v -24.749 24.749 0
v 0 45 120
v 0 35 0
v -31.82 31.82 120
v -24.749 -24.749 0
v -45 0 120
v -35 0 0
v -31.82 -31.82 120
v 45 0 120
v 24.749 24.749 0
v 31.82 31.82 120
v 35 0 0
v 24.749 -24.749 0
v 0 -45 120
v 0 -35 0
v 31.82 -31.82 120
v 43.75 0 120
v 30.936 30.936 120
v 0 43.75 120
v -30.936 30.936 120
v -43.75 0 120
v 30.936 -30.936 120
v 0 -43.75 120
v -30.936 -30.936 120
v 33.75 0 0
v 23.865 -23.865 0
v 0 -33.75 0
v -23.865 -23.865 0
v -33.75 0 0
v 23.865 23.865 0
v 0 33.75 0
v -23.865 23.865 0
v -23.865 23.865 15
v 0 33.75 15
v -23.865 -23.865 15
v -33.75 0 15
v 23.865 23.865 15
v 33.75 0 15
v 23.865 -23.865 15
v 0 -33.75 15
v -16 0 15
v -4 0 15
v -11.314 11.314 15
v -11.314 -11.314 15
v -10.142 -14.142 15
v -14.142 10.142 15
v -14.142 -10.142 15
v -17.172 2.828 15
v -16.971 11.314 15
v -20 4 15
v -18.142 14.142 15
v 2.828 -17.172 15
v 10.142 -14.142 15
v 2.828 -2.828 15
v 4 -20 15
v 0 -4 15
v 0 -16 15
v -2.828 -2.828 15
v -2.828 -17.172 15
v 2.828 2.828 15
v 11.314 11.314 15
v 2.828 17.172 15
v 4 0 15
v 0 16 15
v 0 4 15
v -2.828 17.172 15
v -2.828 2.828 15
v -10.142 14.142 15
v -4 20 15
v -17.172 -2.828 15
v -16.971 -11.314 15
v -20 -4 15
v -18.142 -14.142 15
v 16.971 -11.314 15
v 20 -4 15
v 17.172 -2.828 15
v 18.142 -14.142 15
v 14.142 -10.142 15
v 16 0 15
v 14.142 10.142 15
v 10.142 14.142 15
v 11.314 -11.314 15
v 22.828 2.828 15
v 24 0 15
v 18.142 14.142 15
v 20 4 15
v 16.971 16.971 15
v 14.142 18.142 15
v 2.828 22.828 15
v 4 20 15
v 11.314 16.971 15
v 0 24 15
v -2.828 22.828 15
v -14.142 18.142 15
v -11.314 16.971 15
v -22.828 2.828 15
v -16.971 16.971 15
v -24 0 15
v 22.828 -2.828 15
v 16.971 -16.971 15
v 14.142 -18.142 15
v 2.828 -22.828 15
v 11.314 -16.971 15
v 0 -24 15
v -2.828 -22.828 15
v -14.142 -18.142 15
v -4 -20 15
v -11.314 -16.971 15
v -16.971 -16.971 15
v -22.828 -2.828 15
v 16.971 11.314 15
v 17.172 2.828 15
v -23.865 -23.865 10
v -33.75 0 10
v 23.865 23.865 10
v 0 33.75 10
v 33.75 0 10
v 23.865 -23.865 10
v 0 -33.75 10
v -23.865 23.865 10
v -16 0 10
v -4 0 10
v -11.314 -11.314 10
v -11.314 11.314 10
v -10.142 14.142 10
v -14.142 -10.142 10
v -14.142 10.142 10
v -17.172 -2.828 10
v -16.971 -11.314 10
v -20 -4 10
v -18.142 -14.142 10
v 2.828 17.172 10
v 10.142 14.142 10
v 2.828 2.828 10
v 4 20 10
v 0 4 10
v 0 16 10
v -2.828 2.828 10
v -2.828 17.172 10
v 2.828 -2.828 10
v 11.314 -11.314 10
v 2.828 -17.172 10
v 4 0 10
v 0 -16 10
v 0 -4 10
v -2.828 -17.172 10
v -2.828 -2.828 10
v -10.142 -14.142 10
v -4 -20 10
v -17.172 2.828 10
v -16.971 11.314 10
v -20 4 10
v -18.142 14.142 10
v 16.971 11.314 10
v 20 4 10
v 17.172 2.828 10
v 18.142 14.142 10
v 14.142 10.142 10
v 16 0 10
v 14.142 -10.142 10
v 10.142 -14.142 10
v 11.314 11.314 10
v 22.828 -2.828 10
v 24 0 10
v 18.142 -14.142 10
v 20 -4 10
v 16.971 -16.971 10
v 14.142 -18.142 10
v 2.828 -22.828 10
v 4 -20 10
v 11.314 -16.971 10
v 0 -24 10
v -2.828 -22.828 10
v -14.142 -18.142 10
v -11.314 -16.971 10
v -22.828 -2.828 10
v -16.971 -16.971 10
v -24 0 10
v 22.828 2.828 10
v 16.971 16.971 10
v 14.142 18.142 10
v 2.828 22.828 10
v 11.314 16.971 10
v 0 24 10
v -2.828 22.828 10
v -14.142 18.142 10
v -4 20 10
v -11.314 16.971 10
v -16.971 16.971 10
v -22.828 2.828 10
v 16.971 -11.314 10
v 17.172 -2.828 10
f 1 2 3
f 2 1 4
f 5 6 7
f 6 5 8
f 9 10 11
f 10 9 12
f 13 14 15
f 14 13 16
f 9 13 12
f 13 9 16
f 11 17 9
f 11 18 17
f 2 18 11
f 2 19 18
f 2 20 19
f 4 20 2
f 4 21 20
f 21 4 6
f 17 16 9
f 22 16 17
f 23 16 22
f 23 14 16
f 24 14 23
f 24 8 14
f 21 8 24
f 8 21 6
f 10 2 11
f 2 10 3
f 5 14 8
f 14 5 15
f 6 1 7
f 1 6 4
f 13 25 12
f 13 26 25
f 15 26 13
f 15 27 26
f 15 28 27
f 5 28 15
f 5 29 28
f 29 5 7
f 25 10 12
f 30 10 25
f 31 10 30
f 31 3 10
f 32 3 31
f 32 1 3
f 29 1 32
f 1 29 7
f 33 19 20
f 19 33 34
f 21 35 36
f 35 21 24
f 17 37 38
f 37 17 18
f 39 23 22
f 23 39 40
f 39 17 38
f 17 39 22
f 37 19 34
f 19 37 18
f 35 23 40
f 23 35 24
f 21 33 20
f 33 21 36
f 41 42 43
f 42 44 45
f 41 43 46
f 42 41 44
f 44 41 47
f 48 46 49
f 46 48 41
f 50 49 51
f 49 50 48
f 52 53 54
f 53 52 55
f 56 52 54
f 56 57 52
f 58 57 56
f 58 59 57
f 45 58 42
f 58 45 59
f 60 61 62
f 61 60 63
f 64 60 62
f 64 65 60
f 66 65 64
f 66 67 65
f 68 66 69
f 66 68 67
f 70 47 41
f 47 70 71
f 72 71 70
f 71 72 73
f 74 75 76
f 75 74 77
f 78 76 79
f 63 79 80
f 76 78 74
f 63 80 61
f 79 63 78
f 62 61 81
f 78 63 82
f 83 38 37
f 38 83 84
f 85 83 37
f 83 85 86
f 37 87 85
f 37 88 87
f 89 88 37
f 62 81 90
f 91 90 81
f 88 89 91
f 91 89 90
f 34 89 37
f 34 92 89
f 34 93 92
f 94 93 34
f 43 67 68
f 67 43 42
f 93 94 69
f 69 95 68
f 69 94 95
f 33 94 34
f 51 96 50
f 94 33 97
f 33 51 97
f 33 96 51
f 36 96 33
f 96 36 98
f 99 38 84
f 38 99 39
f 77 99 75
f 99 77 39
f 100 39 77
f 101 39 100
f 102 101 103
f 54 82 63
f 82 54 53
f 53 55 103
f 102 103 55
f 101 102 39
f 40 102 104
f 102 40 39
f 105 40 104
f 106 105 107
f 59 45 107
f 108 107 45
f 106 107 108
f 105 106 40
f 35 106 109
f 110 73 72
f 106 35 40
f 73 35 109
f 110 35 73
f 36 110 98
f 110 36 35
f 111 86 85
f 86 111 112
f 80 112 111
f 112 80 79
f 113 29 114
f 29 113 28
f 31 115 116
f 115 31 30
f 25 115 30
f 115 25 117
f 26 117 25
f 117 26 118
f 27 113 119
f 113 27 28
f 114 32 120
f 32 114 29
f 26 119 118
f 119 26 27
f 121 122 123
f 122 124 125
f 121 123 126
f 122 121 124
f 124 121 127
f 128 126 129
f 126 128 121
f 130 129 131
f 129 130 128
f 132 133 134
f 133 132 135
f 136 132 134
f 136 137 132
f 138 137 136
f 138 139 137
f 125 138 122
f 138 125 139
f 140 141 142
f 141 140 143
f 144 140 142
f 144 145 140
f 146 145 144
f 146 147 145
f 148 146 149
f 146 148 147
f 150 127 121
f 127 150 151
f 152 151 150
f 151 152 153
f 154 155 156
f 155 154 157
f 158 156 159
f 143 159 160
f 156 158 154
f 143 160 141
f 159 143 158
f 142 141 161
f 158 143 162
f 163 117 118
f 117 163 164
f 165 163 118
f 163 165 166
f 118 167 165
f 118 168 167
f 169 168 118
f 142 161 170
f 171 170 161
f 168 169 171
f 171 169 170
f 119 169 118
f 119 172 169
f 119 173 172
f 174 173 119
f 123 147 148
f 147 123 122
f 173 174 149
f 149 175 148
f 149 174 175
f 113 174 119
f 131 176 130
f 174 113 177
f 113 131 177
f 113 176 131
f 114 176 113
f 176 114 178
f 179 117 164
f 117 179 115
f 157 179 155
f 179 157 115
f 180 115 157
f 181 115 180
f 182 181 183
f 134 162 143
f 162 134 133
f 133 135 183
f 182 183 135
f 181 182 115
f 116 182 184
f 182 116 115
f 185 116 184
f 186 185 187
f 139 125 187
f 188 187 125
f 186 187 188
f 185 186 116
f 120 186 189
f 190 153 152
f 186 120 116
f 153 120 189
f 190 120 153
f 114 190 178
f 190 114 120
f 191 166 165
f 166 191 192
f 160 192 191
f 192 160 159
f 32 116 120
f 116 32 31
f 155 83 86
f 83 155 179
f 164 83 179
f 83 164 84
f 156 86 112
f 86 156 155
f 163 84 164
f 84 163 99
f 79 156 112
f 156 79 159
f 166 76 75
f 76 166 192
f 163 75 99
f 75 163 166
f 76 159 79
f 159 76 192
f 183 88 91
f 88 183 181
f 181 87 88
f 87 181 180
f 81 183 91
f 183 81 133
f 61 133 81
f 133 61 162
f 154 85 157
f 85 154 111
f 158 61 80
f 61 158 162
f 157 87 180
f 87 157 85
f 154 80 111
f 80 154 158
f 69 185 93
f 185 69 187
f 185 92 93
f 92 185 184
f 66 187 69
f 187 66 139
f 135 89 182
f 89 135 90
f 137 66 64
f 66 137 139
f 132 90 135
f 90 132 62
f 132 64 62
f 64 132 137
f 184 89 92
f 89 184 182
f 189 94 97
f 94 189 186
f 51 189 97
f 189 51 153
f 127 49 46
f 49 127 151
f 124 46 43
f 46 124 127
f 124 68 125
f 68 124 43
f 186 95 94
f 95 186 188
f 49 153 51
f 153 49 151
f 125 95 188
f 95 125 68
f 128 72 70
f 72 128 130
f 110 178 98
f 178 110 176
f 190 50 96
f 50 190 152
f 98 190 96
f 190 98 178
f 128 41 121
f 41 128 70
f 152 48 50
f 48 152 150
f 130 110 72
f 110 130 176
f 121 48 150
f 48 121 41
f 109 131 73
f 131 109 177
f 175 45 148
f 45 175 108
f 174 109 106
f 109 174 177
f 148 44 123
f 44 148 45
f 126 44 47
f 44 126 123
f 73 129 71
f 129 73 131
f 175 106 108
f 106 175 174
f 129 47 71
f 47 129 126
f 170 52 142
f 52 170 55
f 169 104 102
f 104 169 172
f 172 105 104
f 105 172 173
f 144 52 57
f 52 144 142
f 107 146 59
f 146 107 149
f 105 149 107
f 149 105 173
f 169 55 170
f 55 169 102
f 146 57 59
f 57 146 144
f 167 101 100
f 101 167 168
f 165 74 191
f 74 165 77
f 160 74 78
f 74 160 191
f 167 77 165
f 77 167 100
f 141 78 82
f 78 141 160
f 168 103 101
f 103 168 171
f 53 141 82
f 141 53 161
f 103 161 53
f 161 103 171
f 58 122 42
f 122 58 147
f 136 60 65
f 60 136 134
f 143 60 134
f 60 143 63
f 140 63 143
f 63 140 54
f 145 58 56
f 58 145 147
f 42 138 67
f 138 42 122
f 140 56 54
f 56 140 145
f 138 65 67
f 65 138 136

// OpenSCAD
sides = 8;

height = 120;
bottomRadius = 35;
topRadius = 45;

wallThickness = 2.5;

bottomThickness = 15;

module cupShape () {
    difference() {
        cylinder(h=height, r1=bottomRadius, r2=topRadius, $fn=sides);
        translate(v=[0, 0, bottomThickness]) 
        cylinder(h=height-bottomThickness, r1=(bottomRadius - wallThickness / 2), r2= (topRadius - wallThickness/2), $fn=sides);
        translate(v=[0, 0, 0]) 
        cylinder(h=10, r=(bottomRadius - wallThickness / 2), $fn=sides);
    }
}

module bottomHole () {
    translate(v=[20, 0, 0])
    cylinder(h=20, r=4, $fn=sides);
}

module bottomHoles() {
    for (i=[0:7]) {
        rotate(a=[0, 0, i * 45]) 
        bottomHole();
    }
    translate(v=[-20, 0, 0]) 
    bottomHole();
}

module crossSection () {
    translate(v=[-100, 0, 0]) 
    cube(200);
}

module finalCup () {
    difference() {
        cupShape();
        bottomHoles();
        // crossSection();
    }
}


finalCup();
